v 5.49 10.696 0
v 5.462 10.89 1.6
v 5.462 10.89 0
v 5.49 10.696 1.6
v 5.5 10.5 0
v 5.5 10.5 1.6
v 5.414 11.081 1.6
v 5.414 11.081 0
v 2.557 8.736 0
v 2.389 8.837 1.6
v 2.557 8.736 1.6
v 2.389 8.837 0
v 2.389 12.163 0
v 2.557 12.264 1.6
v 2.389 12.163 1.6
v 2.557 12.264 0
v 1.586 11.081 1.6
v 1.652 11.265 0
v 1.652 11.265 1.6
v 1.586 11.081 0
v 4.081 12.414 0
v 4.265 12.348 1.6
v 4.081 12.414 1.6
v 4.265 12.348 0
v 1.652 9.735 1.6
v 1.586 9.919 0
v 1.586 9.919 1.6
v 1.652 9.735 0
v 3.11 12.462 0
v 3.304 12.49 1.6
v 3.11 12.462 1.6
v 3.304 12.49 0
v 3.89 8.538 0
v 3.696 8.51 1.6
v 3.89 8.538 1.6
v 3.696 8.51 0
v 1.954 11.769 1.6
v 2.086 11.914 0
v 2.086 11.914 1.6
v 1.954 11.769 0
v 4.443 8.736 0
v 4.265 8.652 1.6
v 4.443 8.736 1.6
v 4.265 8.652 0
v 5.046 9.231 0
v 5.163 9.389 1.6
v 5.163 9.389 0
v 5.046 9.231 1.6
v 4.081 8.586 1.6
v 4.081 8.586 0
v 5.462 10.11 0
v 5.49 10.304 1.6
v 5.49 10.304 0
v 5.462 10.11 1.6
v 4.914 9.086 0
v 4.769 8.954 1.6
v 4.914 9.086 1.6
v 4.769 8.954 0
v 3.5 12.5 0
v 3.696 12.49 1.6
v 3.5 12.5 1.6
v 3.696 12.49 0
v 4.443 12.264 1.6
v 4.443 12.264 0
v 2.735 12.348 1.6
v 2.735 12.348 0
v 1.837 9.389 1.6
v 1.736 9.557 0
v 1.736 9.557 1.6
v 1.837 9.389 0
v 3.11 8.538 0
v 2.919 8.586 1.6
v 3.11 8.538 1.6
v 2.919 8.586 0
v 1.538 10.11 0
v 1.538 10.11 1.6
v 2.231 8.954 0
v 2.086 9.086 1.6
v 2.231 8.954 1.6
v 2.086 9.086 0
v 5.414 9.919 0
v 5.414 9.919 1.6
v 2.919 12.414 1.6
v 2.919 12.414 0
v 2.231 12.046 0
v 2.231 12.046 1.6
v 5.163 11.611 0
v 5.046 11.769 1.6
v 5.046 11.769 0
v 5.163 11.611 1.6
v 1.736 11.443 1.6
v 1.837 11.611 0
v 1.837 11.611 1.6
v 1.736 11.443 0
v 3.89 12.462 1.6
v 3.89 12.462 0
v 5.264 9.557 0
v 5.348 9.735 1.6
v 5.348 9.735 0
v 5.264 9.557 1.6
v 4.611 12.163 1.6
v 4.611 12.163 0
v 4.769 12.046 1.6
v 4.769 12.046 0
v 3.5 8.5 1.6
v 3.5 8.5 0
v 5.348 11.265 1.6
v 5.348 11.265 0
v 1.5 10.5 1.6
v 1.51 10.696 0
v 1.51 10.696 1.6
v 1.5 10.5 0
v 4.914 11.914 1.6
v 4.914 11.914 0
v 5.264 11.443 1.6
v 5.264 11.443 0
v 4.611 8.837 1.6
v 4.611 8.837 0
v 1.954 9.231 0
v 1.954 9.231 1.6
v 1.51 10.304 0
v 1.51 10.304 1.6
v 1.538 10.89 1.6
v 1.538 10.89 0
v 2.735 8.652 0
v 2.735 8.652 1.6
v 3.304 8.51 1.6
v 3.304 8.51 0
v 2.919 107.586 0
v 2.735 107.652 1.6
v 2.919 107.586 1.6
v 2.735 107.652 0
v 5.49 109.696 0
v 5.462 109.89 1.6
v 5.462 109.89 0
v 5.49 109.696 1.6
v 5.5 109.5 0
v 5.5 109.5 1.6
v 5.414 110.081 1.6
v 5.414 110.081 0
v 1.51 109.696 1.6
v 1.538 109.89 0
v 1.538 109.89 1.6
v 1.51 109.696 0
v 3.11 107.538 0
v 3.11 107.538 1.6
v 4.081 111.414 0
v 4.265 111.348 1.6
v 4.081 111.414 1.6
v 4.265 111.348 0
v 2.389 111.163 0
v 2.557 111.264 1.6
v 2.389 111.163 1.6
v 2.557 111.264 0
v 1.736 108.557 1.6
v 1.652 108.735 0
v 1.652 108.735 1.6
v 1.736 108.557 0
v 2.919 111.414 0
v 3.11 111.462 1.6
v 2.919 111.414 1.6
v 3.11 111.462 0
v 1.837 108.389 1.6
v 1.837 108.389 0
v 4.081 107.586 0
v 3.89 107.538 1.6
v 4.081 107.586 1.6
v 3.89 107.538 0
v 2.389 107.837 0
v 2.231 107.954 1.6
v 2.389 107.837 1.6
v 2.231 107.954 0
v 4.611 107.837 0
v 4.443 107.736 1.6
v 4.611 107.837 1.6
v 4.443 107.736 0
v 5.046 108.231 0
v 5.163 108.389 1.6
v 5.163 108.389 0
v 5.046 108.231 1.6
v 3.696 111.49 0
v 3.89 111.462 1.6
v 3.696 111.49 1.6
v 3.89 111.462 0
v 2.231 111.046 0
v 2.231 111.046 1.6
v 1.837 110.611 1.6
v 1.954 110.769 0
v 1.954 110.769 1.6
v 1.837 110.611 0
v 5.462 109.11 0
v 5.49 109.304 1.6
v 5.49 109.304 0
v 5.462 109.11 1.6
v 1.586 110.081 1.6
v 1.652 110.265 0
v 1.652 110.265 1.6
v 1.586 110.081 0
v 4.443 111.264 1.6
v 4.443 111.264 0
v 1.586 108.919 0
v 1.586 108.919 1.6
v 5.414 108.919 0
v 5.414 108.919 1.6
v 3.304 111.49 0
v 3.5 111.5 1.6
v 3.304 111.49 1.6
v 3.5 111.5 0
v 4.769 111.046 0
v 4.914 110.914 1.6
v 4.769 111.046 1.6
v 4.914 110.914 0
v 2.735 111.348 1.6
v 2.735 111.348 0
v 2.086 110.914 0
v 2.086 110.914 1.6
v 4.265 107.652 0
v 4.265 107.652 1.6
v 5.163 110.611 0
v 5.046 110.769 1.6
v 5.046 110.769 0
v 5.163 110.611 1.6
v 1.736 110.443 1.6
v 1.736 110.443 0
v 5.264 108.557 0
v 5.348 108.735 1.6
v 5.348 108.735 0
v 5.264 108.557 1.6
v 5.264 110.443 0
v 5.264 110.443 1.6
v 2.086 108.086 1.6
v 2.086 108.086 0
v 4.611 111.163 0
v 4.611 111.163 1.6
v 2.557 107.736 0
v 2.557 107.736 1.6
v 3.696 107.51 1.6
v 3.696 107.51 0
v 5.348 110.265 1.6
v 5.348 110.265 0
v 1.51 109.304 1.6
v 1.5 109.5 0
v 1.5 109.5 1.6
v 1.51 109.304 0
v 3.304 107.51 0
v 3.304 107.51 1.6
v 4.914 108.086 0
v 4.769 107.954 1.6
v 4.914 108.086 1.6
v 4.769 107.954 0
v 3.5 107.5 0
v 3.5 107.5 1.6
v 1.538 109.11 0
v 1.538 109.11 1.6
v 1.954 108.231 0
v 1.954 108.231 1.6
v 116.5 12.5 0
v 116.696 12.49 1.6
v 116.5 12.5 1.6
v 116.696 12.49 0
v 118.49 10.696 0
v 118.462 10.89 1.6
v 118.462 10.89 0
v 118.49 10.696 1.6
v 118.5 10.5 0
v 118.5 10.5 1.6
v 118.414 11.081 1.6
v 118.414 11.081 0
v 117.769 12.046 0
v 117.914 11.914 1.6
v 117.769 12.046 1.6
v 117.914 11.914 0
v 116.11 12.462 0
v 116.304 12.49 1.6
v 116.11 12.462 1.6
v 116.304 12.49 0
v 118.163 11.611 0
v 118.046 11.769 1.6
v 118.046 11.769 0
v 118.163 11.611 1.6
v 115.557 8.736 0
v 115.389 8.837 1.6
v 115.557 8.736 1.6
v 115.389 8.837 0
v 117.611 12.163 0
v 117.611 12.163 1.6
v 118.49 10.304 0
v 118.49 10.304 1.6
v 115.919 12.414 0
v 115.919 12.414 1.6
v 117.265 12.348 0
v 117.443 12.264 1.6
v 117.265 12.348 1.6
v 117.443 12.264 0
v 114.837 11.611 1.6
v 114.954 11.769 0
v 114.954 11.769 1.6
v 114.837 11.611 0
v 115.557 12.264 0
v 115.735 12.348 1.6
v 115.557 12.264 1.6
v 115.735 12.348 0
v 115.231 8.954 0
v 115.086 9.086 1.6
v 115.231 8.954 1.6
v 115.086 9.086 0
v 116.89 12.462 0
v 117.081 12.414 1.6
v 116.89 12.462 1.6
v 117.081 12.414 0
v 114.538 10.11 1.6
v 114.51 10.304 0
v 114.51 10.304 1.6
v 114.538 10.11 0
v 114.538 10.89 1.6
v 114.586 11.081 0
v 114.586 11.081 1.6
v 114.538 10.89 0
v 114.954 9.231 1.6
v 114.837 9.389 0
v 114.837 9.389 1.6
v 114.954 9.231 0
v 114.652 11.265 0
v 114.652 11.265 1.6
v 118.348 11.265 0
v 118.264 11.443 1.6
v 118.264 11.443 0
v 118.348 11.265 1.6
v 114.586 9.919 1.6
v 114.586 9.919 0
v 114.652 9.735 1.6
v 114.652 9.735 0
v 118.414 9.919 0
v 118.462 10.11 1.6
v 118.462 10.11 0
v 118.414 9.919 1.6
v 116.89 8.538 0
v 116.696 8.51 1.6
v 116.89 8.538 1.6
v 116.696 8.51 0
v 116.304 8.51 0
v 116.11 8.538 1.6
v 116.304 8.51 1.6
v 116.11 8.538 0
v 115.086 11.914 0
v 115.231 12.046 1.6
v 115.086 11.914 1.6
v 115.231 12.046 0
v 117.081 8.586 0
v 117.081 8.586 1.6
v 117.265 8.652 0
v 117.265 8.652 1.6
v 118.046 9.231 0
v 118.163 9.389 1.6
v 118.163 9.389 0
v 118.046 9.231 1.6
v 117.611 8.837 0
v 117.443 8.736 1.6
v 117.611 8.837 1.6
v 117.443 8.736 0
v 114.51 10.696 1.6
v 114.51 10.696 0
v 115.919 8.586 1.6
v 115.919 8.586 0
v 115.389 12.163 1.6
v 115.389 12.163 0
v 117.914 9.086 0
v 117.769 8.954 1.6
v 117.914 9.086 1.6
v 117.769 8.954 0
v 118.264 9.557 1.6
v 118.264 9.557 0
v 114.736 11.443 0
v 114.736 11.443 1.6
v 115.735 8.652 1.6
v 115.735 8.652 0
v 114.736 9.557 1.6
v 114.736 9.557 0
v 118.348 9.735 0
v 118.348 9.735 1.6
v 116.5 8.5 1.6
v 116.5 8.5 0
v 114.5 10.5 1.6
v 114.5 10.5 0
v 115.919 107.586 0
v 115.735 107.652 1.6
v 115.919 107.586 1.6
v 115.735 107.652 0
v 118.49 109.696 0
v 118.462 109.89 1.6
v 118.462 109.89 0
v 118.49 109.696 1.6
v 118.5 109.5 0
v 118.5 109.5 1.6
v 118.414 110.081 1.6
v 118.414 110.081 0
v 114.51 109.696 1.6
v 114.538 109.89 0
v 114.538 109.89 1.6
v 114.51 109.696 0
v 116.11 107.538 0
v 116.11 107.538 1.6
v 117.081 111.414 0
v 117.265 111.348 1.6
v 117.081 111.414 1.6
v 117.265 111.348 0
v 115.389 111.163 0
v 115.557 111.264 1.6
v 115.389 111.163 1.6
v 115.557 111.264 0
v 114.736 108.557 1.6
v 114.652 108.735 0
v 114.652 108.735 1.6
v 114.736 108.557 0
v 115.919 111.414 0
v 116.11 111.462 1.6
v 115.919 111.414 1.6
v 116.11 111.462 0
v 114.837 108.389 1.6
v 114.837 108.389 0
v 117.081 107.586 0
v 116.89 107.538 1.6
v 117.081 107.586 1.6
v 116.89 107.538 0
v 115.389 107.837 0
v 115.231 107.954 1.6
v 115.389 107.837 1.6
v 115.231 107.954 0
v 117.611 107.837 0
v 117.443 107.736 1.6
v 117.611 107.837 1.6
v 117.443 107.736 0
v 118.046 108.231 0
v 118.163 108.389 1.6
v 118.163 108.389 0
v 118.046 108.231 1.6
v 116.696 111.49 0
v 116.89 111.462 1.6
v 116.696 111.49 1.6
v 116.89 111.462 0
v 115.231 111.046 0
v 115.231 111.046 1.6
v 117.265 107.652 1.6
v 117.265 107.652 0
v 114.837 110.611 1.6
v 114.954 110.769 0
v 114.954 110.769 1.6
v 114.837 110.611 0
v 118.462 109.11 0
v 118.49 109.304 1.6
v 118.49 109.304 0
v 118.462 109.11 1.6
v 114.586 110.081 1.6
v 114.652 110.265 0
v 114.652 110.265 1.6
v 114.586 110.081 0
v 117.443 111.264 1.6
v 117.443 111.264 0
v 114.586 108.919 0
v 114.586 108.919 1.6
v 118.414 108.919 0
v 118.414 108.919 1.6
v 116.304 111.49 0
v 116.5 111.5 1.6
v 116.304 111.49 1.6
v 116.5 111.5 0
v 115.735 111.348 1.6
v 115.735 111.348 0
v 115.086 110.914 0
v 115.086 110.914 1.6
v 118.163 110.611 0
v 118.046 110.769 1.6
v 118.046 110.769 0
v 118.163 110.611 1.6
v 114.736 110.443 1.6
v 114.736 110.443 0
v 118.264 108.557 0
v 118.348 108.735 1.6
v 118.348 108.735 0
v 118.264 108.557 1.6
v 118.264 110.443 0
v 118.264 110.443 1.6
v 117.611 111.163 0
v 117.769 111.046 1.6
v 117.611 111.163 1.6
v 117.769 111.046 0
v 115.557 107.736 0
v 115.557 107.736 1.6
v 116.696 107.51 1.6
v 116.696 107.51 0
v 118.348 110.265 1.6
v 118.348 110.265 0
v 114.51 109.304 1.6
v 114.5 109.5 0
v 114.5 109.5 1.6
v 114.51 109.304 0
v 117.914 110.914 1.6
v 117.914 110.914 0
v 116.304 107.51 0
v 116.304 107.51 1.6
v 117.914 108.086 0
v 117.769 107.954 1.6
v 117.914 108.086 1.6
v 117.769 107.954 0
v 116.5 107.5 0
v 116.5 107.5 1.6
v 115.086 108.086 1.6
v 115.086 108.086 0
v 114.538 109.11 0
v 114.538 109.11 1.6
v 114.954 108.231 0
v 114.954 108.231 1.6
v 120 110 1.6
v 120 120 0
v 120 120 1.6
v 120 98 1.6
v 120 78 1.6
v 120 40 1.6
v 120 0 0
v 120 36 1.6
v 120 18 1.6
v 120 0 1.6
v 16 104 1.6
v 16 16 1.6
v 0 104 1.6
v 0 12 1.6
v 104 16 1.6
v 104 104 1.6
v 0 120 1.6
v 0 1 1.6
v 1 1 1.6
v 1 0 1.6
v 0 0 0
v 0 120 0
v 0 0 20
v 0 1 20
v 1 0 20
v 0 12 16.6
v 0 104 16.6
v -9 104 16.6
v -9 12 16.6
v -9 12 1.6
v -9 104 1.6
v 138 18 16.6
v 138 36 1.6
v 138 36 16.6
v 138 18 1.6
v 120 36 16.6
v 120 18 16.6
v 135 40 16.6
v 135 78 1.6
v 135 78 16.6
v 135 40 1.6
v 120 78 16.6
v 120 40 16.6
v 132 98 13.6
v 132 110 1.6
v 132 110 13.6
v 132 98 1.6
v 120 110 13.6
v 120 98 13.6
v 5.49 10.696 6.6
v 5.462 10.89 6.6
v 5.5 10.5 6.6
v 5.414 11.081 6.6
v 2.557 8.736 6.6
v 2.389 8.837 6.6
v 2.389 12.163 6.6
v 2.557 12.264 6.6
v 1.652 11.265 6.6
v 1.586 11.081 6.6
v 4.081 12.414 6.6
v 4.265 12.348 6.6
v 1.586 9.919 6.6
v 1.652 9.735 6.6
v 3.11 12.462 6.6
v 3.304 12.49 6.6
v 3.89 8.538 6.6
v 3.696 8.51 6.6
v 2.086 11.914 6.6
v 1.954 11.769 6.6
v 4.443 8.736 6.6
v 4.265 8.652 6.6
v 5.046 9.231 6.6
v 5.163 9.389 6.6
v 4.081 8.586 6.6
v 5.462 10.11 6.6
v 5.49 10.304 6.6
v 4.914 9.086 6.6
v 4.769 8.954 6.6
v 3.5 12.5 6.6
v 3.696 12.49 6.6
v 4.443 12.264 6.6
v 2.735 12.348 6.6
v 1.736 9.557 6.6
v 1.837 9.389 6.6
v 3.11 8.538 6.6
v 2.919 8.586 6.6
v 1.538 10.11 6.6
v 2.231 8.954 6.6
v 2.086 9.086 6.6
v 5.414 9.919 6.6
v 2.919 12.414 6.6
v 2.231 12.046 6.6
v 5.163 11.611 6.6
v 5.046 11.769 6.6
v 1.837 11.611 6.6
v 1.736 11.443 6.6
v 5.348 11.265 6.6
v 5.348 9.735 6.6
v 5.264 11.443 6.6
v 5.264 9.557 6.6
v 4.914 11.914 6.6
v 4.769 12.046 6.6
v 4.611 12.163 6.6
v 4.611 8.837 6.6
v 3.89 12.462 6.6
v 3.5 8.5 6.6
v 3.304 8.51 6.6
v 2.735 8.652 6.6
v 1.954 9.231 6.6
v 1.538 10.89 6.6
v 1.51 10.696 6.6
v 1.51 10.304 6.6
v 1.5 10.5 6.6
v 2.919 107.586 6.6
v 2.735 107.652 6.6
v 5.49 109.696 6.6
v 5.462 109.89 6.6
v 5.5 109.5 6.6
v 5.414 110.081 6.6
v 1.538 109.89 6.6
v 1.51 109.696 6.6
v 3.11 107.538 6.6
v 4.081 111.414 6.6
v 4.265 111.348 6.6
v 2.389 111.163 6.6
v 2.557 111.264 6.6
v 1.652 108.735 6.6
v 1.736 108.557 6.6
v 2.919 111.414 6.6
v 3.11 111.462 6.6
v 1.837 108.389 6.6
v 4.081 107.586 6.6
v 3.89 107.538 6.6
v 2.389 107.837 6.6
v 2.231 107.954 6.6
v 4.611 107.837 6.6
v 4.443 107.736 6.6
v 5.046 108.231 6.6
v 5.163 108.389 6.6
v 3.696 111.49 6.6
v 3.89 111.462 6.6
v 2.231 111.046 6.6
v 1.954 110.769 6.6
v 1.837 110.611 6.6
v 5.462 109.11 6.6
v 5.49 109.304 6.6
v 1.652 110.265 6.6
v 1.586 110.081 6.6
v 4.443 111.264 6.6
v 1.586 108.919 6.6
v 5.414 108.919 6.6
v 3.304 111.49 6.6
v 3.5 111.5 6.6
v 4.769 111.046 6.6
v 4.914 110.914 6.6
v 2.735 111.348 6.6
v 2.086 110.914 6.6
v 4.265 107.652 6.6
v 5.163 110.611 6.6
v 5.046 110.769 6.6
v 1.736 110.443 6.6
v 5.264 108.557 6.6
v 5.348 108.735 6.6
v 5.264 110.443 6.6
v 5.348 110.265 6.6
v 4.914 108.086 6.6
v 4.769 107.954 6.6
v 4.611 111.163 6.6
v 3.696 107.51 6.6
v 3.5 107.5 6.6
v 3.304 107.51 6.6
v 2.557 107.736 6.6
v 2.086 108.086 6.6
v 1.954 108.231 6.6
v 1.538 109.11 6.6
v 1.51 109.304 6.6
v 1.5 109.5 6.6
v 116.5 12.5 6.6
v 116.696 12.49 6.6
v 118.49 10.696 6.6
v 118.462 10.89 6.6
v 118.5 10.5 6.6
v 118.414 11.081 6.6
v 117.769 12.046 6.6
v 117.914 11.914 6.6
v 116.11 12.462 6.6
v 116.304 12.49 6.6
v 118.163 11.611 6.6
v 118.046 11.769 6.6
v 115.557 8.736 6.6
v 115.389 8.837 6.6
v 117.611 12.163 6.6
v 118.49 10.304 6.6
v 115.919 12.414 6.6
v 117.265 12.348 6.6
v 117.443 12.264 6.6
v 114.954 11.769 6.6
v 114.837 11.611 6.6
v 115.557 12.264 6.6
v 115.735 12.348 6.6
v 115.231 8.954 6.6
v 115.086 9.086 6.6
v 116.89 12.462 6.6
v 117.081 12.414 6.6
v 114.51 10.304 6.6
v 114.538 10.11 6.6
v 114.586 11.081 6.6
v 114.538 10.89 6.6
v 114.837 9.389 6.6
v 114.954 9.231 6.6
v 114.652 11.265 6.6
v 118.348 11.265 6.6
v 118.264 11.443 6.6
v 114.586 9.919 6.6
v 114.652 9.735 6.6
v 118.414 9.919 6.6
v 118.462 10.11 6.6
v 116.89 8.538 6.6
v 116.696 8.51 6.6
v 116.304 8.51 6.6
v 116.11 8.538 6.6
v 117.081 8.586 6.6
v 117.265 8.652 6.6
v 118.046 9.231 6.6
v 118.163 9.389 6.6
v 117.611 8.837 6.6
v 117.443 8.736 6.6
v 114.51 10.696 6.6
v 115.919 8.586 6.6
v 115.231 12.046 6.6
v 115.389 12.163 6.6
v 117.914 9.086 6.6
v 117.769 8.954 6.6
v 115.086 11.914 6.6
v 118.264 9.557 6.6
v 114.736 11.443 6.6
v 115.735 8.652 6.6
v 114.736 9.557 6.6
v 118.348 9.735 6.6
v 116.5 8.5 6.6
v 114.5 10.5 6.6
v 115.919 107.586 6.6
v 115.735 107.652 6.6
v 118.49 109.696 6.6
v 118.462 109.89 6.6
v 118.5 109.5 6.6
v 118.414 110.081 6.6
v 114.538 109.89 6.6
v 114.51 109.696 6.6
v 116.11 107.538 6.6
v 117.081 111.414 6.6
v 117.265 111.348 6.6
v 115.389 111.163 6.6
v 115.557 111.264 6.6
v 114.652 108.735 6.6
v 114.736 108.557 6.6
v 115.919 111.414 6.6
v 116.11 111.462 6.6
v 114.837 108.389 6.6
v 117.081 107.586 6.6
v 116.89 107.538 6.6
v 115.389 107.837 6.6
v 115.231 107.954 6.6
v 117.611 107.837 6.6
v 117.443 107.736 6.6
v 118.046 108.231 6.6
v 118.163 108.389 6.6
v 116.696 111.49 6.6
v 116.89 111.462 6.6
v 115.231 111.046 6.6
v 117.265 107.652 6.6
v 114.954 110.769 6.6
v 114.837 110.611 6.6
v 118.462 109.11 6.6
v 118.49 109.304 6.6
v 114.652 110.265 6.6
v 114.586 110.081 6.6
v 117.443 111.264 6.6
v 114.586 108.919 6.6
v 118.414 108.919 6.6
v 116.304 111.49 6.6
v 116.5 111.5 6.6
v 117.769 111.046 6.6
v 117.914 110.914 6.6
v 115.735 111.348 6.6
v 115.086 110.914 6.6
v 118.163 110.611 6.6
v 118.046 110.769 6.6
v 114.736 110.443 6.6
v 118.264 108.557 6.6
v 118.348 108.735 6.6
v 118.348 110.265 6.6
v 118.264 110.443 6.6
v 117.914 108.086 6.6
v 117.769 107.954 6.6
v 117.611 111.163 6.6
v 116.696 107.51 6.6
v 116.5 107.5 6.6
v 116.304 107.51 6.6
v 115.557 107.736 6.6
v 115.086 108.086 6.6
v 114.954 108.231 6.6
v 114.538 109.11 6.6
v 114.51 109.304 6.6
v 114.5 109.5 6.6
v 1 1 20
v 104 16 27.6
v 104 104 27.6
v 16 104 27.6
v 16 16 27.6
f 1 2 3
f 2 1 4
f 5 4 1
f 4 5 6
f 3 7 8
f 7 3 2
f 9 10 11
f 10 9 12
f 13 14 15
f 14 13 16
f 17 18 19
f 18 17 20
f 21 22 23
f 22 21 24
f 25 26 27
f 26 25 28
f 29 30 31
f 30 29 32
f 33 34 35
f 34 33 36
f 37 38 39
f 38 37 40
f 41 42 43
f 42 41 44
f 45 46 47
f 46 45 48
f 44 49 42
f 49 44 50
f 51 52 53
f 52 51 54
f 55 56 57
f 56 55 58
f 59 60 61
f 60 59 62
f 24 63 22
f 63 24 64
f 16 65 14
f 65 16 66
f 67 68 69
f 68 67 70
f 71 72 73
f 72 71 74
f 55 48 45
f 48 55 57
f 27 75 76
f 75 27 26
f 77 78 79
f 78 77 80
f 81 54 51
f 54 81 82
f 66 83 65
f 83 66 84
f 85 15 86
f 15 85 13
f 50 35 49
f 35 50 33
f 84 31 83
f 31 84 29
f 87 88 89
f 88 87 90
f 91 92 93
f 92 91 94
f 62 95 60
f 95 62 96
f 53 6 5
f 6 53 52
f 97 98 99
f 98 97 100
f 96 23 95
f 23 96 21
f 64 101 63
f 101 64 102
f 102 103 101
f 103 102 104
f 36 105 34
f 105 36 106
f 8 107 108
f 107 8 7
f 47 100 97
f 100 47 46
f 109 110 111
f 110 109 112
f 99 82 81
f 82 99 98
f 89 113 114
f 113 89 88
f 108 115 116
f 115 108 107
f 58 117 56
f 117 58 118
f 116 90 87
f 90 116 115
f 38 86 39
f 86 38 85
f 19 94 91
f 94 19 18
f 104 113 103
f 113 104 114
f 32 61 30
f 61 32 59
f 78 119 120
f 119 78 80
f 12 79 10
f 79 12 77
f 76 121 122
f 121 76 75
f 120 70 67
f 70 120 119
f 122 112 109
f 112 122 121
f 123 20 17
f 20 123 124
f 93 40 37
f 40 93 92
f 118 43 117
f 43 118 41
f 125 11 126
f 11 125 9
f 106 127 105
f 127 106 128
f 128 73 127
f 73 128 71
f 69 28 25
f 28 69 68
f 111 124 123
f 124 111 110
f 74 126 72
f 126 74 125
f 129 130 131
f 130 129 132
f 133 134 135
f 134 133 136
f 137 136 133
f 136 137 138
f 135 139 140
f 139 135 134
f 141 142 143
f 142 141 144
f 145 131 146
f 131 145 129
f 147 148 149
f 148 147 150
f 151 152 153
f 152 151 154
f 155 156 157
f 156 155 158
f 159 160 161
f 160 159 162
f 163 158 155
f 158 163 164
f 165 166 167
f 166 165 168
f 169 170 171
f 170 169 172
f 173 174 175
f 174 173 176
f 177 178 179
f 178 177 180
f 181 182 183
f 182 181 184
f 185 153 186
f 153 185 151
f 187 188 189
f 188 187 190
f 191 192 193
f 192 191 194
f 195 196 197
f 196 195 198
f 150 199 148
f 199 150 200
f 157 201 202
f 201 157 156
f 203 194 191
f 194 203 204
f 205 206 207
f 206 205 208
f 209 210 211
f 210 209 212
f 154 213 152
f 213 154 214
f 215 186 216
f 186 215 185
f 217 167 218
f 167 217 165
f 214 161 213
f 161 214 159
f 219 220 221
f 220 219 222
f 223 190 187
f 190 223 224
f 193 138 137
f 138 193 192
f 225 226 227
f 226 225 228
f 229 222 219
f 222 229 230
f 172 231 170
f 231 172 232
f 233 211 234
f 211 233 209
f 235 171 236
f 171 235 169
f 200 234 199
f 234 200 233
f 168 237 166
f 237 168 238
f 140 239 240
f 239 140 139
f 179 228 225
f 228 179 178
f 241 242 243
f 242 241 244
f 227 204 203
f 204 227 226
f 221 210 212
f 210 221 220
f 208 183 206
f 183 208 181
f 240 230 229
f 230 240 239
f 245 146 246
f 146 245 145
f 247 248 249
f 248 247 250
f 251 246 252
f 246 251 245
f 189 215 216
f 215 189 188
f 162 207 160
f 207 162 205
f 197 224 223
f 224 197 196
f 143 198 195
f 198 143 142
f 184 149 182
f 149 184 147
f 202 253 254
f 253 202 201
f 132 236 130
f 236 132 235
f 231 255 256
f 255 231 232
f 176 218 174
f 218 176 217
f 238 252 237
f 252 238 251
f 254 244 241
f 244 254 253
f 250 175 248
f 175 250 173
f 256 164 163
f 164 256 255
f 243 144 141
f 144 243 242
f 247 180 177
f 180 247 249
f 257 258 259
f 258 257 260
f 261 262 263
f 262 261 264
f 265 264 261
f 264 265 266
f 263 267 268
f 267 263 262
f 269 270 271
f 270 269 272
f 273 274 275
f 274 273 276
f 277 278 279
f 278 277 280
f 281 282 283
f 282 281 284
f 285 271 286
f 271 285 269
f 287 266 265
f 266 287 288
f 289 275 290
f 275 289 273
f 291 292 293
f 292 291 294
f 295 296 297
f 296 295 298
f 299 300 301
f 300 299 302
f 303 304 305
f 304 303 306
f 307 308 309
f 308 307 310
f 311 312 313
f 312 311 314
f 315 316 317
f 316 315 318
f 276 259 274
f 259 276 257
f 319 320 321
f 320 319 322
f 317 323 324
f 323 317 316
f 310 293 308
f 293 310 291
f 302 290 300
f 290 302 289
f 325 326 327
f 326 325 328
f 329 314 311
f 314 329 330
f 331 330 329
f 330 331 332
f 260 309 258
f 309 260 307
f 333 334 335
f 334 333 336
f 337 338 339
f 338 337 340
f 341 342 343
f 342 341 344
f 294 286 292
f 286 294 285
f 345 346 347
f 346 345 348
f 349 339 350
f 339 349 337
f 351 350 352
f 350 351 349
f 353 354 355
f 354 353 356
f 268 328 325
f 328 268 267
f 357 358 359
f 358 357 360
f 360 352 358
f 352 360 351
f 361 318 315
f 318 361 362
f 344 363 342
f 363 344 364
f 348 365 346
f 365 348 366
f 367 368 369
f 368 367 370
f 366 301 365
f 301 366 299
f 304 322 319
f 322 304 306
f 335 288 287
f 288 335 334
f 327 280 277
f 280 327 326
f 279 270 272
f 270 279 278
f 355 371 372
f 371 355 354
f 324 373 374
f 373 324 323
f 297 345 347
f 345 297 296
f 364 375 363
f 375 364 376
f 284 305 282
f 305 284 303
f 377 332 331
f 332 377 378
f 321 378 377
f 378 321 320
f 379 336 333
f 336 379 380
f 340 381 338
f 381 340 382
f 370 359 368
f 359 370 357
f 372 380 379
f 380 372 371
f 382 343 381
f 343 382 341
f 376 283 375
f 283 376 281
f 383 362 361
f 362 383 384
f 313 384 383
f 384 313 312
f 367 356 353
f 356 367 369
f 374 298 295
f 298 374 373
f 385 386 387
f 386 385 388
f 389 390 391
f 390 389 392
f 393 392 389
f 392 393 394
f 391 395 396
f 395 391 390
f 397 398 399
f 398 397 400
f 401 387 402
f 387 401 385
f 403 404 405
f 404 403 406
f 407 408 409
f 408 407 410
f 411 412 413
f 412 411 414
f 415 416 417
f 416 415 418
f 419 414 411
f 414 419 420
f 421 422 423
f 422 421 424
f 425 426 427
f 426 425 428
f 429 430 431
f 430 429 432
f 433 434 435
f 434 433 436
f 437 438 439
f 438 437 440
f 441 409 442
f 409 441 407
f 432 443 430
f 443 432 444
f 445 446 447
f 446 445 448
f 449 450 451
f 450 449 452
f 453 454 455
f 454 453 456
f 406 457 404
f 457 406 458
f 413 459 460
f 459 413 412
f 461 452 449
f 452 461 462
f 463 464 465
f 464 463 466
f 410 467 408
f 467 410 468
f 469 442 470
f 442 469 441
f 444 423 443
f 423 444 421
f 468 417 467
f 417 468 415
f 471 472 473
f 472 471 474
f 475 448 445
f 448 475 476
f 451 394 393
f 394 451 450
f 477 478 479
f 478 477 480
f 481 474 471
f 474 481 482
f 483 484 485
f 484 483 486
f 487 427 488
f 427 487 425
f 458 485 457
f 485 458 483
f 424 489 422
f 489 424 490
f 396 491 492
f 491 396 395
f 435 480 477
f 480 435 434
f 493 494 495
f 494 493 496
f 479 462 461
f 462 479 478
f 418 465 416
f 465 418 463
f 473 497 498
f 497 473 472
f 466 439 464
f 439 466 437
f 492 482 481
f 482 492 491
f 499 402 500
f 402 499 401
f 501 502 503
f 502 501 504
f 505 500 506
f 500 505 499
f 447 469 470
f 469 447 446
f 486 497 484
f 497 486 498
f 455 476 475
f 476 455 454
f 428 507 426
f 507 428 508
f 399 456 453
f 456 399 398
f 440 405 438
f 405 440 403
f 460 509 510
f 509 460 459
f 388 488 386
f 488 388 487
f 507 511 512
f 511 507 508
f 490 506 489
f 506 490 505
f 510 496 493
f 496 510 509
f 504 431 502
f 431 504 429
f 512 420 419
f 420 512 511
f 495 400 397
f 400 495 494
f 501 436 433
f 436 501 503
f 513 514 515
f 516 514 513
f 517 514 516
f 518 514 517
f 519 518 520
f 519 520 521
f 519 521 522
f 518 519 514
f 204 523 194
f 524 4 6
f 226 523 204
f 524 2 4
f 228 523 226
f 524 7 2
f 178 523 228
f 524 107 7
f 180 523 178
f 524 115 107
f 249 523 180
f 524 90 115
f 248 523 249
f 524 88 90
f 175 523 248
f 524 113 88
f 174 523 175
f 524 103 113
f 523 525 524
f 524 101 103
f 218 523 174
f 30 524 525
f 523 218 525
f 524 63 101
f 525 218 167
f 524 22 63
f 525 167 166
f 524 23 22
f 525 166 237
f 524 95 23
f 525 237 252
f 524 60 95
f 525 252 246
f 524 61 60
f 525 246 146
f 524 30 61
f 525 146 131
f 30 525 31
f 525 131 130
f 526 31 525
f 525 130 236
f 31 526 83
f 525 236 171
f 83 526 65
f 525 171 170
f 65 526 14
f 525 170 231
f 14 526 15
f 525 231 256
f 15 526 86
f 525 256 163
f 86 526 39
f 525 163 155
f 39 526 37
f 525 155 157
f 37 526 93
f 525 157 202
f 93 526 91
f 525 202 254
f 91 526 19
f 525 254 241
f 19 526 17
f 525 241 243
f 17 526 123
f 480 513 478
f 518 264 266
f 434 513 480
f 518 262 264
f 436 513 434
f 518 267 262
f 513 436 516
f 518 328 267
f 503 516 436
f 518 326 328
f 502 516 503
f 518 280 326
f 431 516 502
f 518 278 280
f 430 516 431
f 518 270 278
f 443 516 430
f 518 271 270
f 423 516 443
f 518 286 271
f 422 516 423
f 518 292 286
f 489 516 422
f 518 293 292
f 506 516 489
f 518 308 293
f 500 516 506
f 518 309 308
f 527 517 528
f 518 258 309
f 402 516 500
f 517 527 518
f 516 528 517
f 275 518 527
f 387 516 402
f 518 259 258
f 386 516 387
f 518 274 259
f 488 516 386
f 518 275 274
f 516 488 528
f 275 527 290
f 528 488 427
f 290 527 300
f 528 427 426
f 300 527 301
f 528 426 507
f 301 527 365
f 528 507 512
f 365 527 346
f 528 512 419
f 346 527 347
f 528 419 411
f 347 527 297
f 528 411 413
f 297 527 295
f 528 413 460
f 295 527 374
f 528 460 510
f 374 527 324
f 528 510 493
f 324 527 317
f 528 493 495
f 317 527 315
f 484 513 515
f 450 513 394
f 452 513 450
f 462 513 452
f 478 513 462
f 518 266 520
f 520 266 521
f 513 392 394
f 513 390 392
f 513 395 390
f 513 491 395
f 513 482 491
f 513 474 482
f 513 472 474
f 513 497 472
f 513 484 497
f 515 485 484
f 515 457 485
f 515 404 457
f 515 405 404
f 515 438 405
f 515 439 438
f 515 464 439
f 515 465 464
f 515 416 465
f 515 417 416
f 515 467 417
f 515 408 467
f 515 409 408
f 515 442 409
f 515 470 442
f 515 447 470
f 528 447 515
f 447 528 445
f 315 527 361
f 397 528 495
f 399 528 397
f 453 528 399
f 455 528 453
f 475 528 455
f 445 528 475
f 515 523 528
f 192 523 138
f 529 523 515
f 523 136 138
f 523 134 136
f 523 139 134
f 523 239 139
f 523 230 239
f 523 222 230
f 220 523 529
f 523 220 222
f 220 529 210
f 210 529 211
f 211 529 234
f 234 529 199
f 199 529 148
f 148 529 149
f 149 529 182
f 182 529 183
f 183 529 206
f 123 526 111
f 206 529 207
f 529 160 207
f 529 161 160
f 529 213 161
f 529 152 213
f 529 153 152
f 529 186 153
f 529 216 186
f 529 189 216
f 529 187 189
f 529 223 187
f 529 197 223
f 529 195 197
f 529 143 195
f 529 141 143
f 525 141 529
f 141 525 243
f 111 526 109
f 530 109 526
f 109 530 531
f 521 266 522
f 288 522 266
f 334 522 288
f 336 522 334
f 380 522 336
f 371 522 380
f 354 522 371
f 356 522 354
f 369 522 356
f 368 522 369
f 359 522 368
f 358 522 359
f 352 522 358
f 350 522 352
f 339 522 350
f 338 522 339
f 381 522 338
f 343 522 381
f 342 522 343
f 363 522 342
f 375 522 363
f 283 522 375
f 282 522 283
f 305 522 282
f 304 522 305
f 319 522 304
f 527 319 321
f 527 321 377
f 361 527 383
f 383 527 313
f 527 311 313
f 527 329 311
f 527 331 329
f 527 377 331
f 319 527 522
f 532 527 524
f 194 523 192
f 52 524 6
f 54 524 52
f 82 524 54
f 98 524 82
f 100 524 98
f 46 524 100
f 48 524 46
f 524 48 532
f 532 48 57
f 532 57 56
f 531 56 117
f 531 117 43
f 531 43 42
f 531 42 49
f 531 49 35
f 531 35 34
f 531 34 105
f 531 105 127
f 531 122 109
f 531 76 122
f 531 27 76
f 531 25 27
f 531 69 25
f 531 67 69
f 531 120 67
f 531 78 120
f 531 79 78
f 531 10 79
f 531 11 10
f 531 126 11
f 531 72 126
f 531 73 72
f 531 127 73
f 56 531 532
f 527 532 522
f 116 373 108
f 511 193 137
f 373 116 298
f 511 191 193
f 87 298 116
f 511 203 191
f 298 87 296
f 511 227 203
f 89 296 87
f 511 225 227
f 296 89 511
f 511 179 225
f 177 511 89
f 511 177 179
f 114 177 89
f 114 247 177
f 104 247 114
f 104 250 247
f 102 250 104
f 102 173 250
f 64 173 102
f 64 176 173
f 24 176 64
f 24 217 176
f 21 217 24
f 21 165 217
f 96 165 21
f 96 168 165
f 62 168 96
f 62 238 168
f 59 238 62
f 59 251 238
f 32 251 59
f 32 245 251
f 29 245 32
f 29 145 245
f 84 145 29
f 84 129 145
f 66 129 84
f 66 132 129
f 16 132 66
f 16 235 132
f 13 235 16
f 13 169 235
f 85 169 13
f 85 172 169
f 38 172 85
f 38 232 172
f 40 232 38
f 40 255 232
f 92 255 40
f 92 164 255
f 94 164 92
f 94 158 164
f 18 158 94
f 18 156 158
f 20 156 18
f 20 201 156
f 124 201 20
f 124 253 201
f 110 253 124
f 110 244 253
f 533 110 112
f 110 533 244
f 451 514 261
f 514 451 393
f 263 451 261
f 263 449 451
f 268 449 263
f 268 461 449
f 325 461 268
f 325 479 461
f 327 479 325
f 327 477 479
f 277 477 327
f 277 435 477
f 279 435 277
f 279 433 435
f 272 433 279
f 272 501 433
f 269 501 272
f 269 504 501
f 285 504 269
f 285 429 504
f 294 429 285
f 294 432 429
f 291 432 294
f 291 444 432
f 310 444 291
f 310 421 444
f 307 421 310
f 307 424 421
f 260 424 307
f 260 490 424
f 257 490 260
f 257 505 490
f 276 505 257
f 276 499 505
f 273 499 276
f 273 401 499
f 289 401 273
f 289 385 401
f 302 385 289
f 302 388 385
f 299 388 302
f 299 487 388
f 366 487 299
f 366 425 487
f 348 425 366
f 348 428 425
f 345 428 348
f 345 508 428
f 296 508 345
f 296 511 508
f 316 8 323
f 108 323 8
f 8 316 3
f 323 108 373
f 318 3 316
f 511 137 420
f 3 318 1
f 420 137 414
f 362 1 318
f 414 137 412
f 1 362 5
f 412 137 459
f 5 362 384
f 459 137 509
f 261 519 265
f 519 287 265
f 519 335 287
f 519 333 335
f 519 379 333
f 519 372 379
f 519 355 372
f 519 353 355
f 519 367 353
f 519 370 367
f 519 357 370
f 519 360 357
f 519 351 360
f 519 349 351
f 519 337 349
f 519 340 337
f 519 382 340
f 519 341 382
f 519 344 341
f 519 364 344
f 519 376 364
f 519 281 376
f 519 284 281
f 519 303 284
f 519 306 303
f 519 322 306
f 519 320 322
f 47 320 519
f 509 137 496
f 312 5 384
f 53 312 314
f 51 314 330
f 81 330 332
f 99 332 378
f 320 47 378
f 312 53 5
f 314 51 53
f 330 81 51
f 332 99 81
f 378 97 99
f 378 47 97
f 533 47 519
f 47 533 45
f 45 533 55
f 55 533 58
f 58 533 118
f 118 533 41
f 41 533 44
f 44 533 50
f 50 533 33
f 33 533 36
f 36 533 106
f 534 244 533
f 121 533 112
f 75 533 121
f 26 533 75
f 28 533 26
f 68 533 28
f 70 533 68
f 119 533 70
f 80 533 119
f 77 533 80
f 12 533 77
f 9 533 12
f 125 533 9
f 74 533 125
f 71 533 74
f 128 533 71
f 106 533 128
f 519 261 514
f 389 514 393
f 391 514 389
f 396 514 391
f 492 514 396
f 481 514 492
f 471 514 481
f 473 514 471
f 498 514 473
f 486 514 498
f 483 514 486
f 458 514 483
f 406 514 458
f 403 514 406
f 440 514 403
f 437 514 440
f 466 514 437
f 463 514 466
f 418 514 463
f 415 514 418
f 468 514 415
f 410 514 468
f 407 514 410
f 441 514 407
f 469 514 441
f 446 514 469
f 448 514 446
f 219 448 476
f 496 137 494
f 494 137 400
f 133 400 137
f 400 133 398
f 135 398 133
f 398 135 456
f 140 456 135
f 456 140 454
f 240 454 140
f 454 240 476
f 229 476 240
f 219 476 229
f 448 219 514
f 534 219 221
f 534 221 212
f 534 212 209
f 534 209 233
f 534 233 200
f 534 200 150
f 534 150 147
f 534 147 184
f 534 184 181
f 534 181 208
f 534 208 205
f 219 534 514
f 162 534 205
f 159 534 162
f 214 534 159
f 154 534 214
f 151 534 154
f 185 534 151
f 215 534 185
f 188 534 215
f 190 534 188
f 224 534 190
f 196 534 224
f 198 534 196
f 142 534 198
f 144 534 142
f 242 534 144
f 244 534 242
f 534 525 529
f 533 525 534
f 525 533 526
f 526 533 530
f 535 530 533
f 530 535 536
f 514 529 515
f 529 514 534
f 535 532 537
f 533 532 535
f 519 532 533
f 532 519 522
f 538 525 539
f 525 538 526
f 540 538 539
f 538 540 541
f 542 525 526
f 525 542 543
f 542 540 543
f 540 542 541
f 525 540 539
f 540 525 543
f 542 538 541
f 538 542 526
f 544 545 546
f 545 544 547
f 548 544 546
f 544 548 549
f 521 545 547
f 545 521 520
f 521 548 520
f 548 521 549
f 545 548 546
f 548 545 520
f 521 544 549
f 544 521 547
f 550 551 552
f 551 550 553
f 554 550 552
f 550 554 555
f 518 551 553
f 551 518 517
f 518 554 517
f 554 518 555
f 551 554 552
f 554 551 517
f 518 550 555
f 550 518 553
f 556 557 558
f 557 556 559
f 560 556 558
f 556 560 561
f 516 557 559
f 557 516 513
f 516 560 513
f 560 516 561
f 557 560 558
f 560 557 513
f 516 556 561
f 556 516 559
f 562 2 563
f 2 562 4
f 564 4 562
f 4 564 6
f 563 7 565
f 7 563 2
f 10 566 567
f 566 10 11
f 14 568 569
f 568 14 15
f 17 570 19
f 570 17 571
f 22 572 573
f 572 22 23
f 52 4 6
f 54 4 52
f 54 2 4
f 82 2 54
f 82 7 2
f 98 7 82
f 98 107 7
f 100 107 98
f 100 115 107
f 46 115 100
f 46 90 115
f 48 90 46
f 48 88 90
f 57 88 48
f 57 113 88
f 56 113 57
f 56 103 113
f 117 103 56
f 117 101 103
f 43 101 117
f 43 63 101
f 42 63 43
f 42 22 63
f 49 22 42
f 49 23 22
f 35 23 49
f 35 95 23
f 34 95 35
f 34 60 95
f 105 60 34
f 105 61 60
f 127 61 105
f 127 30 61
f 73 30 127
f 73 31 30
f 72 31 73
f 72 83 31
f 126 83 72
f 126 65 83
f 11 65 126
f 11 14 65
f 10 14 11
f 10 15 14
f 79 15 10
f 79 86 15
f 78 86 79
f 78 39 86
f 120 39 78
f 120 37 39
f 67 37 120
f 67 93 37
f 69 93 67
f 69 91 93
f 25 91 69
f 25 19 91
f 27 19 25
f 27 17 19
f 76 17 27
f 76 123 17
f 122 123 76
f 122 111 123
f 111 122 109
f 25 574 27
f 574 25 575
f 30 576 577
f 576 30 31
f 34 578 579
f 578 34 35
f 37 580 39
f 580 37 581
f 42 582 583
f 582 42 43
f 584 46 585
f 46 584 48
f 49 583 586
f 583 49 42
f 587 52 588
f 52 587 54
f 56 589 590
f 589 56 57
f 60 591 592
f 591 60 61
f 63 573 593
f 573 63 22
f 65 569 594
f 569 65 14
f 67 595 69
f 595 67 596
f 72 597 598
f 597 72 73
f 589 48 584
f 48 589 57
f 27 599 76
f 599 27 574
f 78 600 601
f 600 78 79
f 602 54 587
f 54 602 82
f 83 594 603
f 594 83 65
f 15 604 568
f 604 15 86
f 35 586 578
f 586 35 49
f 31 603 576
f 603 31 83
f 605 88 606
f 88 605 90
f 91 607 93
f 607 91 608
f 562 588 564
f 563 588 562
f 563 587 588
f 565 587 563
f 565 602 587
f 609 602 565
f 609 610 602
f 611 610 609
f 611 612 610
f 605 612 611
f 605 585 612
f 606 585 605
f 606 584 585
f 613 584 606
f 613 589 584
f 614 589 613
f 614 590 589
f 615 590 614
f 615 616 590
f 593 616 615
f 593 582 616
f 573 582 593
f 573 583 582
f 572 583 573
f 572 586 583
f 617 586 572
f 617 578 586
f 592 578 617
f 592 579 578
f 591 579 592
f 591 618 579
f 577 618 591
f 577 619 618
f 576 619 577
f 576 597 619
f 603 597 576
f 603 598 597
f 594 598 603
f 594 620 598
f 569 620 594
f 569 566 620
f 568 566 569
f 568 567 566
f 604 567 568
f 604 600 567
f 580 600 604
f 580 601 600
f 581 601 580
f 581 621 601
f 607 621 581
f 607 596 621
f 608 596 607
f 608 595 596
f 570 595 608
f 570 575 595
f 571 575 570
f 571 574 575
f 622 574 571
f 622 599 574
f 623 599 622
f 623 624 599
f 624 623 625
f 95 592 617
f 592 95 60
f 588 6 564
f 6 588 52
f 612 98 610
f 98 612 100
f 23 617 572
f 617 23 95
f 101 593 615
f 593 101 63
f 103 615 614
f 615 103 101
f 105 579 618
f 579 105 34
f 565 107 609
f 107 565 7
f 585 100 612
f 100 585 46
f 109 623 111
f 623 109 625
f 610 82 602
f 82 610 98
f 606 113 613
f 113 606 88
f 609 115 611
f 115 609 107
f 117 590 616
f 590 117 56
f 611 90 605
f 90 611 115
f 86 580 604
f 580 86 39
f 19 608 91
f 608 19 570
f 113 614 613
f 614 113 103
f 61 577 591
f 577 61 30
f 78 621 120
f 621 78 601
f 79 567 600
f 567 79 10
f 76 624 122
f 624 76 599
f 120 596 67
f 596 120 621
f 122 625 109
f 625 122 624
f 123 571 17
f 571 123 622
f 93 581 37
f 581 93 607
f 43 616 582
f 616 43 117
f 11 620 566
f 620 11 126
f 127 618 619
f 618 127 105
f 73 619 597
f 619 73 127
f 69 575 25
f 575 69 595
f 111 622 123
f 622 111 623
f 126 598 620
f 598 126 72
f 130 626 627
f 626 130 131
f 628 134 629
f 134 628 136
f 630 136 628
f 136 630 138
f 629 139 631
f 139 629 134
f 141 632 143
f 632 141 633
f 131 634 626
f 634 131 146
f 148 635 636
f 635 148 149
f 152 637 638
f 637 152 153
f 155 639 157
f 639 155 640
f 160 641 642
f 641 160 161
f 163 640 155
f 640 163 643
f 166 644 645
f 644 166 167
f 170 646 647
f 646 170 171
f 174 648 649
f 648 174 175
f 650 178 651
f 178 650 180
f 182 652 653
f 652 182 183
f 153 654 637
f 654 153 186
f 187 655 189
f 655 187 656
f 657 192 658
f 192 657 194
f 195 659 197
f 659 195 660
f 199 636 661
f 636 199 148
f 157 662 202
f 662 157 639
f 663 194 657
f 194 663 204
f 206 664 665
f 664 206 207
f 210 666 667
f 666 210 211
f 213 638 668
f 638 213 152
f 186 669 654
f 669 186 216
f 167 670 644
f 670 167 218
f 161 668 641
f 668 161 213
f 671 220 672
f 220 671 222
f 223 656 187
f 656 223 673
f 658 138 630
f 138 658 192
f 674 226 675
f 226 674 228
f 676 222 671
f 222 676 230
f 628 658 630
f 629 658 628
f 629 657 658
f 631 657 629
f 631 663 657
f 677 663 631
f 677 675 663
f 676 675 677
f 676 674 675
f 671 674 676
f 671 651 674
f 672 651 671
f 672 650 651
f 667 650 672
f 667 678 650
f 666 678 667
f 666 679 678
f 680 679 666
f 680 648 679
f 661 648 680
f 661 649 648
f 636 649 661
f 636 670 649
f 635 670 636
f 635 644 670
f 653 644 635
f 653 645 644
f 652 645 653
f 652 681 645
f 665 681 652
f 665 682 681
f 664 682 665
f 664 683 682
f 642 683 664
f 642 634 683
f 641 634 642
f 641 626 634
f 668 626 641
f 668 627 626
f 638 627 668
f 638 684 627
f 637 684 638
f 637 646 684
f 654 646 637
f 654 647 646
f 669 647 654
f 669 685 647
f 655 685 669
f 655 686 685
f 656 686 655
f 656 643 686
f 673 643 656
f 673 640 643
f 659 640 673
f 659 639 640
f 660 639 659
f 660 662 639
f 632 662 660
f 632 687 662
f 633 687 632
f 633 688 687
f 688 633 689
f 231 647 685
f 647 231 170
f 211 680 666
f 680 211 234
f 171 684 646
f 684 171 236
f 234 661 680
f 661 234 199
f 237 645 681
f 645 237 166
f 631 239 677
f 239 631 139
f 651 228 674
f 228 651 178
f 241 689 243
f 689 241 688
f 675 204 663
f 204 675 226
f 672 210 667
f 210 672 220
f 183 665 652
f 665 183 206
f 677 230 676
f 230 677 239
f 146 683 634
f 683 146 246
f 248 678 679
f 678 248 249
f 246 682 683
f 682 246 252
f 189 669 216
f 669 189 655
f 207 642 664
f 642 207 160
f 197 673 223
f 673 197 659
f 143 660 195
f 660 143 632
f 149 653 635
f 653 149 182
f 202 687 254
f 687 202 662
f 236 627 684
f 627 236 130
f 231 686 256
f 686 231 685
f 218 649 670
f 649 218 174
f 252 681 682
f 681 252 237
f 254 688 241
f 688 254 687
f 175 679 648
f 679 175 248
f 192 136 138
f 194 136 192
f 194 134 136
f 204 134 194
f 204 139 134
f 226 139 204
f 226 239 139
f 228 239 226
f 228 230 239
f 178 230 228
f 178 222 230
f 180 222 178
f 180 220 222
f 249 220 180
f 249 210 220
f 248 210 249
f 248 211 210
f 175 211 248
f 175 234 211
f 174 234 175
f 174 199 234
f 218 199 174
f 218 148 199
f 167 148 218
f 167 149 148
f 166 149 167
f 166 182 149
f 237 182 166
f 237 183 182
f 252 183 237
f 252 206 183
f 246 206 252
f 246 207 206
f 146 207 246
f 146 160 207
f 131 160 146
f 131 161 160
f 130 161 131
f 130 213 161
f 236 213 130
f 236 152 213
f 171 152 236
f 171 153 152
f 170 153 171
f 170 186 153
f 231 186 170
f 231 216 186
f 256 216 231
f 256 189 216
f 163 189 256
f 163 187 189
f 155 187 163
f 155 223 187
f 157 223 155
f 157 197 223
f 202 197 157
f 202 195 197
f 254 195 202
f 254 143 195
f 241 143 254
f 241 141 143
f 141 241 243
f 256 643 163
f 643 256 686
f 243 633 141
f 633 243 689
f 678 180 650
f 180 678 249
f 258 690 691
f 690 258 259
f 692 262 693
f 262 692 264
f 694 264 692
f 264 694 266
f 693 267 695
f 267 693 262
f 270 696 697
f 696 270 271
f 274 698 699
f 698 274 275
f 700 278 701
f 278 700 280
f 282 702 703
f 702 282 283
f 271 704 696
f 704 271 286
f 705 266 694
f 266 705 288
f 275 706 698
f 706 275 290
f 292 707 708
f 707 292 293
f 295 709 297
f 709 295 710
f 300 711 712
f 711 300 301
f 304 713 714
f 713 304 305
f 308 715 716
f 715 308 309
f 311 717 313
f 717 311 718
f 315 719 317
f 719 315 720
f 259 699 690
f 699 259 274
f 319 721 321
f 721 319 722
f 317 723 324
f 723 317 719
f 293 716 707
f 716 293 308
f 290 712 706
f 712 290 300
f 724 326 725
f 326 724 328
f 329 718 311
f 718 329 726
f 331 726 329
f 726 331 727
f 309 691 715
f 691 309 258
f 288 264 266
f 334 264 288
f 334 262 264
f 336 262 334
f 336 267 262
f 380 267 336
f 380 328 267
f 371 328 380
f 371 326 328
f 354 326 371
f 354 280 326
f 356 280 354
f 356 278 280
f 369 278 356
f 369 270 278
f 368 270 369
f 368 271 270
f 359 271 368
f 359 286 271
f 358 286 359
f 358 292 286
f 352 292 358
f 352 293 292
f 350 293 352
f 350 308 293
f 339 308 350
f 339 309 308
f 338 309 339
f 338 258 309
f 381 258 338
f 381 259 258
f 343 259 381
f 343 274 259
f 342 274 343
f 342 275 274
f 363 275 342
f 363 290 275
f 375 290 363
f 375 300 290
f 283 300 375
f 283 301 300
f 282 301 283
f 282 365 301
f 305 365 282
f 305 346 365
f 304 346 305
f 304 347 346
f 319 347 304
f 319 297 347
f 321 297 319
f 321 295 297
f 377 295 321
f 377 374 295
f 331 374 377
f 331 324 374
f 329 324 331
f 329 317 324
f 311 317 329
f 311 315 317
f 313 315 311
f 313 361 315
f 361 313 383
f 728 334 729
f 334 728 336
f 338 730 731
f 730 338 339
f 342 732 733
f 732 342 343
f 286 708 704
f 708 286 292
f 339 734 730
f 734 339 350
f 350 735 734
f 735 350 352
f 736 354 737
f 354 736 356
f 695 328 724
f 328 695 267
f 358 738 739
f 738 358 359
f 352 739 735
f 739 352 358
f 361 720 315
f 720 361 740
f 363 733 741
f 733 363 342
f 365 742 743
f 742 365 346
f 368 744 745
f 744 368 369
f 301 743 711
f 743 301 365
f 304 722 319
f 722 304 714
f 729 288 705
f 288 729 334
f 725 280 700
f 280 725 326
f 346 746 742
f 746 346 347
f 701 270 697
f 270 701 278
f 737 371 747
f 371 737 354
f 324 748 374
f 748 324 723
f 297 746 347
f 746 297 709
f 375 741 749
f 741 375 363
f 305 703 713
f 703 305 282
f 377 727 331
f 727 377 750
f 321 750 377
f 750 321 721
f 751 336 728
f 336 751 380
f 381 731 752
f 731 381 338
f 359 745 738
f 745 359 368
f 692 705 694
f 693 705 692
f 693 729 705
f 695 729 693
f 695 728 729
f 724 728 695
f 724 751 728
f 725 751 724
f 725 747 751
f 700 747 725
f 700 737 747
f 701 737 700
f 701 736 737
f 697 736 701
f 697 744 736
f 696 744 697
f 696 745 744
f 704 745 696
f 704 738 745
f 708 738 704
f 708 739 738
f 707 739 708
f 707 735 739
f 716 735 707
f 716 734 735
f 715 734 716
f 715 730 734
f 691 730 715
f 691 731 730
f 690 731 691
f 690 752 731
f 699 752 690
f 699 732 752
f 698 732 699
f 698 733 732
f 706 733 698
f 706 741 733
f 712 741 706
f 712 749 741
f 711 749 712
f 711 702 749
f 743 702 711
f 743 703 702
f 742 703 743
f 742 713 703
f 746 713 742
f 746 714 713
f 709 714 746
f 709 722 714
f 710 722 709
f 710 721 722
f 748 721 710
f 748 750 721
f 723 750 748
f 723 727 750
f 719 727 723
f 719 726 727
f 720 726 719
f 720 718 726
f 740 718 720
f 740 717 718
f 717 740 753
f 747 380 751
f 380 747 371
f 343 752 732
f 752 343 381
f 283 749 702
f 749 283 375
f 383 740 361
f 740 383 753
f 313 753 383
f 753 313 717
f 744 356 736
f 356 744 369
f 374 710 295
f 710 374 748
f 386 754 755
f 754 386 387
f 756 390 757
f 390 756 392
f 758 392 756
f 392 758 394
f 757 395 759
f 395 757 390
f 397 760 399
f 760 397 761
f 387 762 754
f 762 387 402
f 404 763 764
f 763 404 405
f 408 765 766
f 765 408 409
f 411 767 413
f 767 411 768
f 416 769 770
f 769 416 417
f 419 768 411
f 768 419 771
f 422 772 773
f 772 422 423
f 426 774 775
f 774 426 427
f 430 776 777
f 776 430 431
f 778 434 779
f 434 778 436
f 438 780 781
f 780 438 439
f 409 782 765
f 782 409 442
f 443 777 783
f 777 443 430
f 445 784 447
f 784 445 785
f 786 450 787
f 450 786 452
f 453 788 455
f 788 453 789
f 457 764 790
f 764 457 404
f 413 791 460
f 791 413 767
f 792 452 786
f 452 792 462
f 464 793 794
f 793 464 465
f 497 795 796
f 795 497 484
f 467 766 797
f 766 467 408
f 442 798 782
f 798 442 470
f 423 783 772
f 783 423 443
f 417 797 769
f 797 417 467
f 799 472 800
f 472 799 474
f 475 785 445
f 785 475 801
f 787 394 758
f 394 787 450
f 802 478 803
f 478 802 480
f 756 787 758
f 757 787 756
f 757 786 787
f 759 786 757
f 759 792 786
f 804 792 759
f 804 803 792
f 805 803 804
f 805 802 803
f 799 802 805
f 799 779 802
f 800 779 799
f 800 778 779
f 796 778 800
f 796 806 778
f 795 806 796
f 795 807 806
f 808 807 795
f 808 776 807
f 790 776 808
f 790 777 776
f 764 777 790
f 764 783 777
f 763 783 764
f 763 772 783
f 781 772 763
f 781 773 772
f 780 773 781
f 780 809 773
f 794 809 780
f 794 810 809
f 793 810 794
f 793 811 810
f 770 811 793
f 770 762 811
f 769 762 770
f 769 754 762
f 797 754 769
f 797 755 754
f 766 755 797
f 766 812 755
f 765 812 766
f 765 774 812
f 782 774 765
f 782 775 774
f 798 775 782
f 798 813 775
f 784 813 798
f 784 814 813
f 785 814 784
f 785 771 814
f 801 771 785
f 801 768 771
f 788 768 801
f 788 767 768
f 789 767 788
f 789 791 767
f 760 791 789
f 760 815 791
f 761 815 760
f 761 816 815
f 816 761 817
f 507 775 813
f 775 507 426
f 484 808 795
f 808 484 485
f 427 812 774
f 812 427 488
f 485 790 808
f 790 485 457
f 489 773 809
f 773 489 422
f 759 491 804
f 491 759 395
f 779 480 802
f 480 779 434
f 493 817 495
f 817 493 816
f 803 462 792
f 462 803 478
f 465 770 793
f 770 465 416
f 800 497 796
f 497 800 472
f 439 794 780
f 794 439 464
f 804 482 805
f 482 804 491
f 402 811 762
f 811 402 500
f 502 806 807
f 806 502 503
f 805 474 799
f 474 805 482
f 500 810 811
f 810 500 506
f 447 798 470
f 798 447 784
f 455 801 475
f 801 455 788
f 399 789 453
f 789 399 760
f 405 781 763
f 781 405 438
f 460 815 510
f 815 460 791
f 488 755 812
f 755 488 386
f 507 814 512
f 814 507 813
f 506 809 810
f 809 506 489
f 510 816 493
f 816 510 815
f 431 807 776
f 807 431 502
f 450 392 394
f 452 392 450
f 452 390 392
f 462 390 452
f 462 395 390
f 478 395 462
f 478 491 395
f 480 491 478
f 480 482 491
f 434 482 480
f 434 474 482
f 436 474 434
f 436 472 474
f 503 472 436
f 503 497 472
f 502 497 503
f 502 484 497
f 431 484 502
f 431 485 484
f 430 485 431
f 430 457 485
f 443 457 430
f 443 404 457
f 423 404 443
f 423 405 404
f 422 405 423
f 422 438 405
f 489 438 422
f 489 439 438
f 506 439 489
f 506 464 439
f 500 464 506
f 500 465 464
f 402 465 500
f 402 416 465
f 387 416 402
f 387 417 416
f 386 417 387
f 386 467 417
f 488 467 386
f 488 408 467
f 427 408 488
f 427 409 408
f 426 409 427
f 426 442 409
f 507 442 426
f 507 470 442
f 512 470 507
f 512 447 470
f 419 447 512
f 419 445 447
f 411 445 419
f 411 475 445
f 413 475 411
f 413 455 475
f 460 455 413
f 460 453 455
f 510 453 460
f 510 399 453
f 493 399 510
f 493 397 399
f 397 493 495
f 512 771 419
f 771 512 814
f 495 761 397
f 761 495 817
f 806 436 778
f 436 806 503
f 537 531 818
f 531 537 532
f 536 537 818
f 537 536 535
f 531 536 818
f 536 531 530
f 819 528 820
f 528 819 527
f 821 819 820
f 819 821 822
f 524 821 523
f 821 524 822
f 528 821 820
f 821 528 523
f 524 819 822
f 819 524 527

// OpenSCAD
//
// ============================================================================
// SteamMachine UM790
// Project Phoenix
//
// Archivo    : pcb_um790.scad
// Versión    : 1.0
//
// Modelo de referencia de la placa base Minisforum UM790 Pro.
//
// NO ES UNA PIEZA IMPRIMIBLE.
//
// Se utiliza para:
//
//  • Verificar interferencias.
//  • Posicionar los postes.
//  • Diseñar la bandeja.
//  • Diseñar el panel trasero.
//  • Diseñar la tapa.
//
// ============================================================================

$fn = 64;


//=============================================================================
// PARÁMETROS
//=============================================================================

PCB_WIDTH      = 120.0;
PCB_DEPTH      = 120.0;
PCB_THICKNESS  = 1.60;

MOUNT_X = 113.0;
MOUNT_Y = 99.0;

HOLE_D = 4.0;


//=============================================================================
// COLORES
//=============================================================================

PCB_COLOR       = [0.10,0.45,0.12];
CONNECTOR_COLOR = [0.72,0.72,0.72];
HOLE_COLOR      = [1.00,0.00,0.00];


//=============================================================================
// CUERPO PCB
//=============================================================================

module pcb_body()
{

    color(PCB_COLOR)

    difference()
    {

        cube(
            [
                PCB_WIDTH,
                PCB_DEPTH,
                PCB_THICKNESS
            ]);

        translate(
        [
            (PCB_WIDTH-MOUNT_X)/2,
            (PCB_DEPTH-MOUNT_Y)/2,
            -0.2
        ])

        for(ix=[0:1])
        for(iy=[0:1])

            translate(
            [
                ix*MOUNT_X,
                iy*MOUNT_Y,
                0
            ])

            cylinder(
                d = HOLE_D,
                h = PCB_THICKNESS+0.4);

    }

}


//=============================================================================
// CENTROS DE MONTAJE
//=============================================================================

module mounting_points()
{

    color(HOLE_COLOR)

    translate(
    [
        (PCB_WIDTH-MOUNT_X)/2,
        (PCB_DEPTH-MOUNT_Y)/2,
        PCB_THICKNESS
    ])

    for(ix=[0:1])
    for(iy=[0:1])

        translate(
        [
            ix*MOUNT_X,
            iy*MOUNT_Y,
            0
        ])

        cylinder(
            d = 4,
            h = 5);

}


//=============================================================================
// BLOQUES DE CONECTORES
//=============================================================================

module connectors()
{

    color(CONNECTOR_COLOR)
    {

        //
        // Lateral izquierdo
        //

        translate([-9,12,PCB_THICKNESS])
            cube([9,92,15]);

        //
        // RJ45
        //

        translate([PCB_WIDTH,18,PCB_THICKNESS])
            cube([18,18,15]);

        //
        // USB
        //

        translate([PCB_WIDTH,40,PCB_THICKNESS])
            cube([15,38,15]);

        //
        // Alimentación
        //

        translate([PCB_WIDTH,98,PCB_THICKNESS])
            cube([12,12,12]);

    }

}


//=============================================================================
// VOLUMEN APROXIMADO DEL DISIPADOR
//=============================================================================

module cooler_volume()
{

    color([0.25,0.25,0.25,0.35])

    translate([16,16,PCB_THICKNESS])

        cube(
        [
            88,
            88,
            26
        ]);

}


//=============================================================================
// REFERENCIA DE EJES
//=============================================================================

module axes(length=20)
{

    color("red")
        cube([length,1,1]);

    color("green")
        cube([1,length,1]);

    color("blue")
        cube([1,1,length]);

}


//=============================================================================
// ENSAMBLAJE
//=============================================================================

module pcb_um790()
{

    pcb_body();

    connectors();

    cooler_volume();

    mounting_points();

    axes();

}


//=============================================================================
// PREVIEW
//=============================================================================

pcb_um790();
